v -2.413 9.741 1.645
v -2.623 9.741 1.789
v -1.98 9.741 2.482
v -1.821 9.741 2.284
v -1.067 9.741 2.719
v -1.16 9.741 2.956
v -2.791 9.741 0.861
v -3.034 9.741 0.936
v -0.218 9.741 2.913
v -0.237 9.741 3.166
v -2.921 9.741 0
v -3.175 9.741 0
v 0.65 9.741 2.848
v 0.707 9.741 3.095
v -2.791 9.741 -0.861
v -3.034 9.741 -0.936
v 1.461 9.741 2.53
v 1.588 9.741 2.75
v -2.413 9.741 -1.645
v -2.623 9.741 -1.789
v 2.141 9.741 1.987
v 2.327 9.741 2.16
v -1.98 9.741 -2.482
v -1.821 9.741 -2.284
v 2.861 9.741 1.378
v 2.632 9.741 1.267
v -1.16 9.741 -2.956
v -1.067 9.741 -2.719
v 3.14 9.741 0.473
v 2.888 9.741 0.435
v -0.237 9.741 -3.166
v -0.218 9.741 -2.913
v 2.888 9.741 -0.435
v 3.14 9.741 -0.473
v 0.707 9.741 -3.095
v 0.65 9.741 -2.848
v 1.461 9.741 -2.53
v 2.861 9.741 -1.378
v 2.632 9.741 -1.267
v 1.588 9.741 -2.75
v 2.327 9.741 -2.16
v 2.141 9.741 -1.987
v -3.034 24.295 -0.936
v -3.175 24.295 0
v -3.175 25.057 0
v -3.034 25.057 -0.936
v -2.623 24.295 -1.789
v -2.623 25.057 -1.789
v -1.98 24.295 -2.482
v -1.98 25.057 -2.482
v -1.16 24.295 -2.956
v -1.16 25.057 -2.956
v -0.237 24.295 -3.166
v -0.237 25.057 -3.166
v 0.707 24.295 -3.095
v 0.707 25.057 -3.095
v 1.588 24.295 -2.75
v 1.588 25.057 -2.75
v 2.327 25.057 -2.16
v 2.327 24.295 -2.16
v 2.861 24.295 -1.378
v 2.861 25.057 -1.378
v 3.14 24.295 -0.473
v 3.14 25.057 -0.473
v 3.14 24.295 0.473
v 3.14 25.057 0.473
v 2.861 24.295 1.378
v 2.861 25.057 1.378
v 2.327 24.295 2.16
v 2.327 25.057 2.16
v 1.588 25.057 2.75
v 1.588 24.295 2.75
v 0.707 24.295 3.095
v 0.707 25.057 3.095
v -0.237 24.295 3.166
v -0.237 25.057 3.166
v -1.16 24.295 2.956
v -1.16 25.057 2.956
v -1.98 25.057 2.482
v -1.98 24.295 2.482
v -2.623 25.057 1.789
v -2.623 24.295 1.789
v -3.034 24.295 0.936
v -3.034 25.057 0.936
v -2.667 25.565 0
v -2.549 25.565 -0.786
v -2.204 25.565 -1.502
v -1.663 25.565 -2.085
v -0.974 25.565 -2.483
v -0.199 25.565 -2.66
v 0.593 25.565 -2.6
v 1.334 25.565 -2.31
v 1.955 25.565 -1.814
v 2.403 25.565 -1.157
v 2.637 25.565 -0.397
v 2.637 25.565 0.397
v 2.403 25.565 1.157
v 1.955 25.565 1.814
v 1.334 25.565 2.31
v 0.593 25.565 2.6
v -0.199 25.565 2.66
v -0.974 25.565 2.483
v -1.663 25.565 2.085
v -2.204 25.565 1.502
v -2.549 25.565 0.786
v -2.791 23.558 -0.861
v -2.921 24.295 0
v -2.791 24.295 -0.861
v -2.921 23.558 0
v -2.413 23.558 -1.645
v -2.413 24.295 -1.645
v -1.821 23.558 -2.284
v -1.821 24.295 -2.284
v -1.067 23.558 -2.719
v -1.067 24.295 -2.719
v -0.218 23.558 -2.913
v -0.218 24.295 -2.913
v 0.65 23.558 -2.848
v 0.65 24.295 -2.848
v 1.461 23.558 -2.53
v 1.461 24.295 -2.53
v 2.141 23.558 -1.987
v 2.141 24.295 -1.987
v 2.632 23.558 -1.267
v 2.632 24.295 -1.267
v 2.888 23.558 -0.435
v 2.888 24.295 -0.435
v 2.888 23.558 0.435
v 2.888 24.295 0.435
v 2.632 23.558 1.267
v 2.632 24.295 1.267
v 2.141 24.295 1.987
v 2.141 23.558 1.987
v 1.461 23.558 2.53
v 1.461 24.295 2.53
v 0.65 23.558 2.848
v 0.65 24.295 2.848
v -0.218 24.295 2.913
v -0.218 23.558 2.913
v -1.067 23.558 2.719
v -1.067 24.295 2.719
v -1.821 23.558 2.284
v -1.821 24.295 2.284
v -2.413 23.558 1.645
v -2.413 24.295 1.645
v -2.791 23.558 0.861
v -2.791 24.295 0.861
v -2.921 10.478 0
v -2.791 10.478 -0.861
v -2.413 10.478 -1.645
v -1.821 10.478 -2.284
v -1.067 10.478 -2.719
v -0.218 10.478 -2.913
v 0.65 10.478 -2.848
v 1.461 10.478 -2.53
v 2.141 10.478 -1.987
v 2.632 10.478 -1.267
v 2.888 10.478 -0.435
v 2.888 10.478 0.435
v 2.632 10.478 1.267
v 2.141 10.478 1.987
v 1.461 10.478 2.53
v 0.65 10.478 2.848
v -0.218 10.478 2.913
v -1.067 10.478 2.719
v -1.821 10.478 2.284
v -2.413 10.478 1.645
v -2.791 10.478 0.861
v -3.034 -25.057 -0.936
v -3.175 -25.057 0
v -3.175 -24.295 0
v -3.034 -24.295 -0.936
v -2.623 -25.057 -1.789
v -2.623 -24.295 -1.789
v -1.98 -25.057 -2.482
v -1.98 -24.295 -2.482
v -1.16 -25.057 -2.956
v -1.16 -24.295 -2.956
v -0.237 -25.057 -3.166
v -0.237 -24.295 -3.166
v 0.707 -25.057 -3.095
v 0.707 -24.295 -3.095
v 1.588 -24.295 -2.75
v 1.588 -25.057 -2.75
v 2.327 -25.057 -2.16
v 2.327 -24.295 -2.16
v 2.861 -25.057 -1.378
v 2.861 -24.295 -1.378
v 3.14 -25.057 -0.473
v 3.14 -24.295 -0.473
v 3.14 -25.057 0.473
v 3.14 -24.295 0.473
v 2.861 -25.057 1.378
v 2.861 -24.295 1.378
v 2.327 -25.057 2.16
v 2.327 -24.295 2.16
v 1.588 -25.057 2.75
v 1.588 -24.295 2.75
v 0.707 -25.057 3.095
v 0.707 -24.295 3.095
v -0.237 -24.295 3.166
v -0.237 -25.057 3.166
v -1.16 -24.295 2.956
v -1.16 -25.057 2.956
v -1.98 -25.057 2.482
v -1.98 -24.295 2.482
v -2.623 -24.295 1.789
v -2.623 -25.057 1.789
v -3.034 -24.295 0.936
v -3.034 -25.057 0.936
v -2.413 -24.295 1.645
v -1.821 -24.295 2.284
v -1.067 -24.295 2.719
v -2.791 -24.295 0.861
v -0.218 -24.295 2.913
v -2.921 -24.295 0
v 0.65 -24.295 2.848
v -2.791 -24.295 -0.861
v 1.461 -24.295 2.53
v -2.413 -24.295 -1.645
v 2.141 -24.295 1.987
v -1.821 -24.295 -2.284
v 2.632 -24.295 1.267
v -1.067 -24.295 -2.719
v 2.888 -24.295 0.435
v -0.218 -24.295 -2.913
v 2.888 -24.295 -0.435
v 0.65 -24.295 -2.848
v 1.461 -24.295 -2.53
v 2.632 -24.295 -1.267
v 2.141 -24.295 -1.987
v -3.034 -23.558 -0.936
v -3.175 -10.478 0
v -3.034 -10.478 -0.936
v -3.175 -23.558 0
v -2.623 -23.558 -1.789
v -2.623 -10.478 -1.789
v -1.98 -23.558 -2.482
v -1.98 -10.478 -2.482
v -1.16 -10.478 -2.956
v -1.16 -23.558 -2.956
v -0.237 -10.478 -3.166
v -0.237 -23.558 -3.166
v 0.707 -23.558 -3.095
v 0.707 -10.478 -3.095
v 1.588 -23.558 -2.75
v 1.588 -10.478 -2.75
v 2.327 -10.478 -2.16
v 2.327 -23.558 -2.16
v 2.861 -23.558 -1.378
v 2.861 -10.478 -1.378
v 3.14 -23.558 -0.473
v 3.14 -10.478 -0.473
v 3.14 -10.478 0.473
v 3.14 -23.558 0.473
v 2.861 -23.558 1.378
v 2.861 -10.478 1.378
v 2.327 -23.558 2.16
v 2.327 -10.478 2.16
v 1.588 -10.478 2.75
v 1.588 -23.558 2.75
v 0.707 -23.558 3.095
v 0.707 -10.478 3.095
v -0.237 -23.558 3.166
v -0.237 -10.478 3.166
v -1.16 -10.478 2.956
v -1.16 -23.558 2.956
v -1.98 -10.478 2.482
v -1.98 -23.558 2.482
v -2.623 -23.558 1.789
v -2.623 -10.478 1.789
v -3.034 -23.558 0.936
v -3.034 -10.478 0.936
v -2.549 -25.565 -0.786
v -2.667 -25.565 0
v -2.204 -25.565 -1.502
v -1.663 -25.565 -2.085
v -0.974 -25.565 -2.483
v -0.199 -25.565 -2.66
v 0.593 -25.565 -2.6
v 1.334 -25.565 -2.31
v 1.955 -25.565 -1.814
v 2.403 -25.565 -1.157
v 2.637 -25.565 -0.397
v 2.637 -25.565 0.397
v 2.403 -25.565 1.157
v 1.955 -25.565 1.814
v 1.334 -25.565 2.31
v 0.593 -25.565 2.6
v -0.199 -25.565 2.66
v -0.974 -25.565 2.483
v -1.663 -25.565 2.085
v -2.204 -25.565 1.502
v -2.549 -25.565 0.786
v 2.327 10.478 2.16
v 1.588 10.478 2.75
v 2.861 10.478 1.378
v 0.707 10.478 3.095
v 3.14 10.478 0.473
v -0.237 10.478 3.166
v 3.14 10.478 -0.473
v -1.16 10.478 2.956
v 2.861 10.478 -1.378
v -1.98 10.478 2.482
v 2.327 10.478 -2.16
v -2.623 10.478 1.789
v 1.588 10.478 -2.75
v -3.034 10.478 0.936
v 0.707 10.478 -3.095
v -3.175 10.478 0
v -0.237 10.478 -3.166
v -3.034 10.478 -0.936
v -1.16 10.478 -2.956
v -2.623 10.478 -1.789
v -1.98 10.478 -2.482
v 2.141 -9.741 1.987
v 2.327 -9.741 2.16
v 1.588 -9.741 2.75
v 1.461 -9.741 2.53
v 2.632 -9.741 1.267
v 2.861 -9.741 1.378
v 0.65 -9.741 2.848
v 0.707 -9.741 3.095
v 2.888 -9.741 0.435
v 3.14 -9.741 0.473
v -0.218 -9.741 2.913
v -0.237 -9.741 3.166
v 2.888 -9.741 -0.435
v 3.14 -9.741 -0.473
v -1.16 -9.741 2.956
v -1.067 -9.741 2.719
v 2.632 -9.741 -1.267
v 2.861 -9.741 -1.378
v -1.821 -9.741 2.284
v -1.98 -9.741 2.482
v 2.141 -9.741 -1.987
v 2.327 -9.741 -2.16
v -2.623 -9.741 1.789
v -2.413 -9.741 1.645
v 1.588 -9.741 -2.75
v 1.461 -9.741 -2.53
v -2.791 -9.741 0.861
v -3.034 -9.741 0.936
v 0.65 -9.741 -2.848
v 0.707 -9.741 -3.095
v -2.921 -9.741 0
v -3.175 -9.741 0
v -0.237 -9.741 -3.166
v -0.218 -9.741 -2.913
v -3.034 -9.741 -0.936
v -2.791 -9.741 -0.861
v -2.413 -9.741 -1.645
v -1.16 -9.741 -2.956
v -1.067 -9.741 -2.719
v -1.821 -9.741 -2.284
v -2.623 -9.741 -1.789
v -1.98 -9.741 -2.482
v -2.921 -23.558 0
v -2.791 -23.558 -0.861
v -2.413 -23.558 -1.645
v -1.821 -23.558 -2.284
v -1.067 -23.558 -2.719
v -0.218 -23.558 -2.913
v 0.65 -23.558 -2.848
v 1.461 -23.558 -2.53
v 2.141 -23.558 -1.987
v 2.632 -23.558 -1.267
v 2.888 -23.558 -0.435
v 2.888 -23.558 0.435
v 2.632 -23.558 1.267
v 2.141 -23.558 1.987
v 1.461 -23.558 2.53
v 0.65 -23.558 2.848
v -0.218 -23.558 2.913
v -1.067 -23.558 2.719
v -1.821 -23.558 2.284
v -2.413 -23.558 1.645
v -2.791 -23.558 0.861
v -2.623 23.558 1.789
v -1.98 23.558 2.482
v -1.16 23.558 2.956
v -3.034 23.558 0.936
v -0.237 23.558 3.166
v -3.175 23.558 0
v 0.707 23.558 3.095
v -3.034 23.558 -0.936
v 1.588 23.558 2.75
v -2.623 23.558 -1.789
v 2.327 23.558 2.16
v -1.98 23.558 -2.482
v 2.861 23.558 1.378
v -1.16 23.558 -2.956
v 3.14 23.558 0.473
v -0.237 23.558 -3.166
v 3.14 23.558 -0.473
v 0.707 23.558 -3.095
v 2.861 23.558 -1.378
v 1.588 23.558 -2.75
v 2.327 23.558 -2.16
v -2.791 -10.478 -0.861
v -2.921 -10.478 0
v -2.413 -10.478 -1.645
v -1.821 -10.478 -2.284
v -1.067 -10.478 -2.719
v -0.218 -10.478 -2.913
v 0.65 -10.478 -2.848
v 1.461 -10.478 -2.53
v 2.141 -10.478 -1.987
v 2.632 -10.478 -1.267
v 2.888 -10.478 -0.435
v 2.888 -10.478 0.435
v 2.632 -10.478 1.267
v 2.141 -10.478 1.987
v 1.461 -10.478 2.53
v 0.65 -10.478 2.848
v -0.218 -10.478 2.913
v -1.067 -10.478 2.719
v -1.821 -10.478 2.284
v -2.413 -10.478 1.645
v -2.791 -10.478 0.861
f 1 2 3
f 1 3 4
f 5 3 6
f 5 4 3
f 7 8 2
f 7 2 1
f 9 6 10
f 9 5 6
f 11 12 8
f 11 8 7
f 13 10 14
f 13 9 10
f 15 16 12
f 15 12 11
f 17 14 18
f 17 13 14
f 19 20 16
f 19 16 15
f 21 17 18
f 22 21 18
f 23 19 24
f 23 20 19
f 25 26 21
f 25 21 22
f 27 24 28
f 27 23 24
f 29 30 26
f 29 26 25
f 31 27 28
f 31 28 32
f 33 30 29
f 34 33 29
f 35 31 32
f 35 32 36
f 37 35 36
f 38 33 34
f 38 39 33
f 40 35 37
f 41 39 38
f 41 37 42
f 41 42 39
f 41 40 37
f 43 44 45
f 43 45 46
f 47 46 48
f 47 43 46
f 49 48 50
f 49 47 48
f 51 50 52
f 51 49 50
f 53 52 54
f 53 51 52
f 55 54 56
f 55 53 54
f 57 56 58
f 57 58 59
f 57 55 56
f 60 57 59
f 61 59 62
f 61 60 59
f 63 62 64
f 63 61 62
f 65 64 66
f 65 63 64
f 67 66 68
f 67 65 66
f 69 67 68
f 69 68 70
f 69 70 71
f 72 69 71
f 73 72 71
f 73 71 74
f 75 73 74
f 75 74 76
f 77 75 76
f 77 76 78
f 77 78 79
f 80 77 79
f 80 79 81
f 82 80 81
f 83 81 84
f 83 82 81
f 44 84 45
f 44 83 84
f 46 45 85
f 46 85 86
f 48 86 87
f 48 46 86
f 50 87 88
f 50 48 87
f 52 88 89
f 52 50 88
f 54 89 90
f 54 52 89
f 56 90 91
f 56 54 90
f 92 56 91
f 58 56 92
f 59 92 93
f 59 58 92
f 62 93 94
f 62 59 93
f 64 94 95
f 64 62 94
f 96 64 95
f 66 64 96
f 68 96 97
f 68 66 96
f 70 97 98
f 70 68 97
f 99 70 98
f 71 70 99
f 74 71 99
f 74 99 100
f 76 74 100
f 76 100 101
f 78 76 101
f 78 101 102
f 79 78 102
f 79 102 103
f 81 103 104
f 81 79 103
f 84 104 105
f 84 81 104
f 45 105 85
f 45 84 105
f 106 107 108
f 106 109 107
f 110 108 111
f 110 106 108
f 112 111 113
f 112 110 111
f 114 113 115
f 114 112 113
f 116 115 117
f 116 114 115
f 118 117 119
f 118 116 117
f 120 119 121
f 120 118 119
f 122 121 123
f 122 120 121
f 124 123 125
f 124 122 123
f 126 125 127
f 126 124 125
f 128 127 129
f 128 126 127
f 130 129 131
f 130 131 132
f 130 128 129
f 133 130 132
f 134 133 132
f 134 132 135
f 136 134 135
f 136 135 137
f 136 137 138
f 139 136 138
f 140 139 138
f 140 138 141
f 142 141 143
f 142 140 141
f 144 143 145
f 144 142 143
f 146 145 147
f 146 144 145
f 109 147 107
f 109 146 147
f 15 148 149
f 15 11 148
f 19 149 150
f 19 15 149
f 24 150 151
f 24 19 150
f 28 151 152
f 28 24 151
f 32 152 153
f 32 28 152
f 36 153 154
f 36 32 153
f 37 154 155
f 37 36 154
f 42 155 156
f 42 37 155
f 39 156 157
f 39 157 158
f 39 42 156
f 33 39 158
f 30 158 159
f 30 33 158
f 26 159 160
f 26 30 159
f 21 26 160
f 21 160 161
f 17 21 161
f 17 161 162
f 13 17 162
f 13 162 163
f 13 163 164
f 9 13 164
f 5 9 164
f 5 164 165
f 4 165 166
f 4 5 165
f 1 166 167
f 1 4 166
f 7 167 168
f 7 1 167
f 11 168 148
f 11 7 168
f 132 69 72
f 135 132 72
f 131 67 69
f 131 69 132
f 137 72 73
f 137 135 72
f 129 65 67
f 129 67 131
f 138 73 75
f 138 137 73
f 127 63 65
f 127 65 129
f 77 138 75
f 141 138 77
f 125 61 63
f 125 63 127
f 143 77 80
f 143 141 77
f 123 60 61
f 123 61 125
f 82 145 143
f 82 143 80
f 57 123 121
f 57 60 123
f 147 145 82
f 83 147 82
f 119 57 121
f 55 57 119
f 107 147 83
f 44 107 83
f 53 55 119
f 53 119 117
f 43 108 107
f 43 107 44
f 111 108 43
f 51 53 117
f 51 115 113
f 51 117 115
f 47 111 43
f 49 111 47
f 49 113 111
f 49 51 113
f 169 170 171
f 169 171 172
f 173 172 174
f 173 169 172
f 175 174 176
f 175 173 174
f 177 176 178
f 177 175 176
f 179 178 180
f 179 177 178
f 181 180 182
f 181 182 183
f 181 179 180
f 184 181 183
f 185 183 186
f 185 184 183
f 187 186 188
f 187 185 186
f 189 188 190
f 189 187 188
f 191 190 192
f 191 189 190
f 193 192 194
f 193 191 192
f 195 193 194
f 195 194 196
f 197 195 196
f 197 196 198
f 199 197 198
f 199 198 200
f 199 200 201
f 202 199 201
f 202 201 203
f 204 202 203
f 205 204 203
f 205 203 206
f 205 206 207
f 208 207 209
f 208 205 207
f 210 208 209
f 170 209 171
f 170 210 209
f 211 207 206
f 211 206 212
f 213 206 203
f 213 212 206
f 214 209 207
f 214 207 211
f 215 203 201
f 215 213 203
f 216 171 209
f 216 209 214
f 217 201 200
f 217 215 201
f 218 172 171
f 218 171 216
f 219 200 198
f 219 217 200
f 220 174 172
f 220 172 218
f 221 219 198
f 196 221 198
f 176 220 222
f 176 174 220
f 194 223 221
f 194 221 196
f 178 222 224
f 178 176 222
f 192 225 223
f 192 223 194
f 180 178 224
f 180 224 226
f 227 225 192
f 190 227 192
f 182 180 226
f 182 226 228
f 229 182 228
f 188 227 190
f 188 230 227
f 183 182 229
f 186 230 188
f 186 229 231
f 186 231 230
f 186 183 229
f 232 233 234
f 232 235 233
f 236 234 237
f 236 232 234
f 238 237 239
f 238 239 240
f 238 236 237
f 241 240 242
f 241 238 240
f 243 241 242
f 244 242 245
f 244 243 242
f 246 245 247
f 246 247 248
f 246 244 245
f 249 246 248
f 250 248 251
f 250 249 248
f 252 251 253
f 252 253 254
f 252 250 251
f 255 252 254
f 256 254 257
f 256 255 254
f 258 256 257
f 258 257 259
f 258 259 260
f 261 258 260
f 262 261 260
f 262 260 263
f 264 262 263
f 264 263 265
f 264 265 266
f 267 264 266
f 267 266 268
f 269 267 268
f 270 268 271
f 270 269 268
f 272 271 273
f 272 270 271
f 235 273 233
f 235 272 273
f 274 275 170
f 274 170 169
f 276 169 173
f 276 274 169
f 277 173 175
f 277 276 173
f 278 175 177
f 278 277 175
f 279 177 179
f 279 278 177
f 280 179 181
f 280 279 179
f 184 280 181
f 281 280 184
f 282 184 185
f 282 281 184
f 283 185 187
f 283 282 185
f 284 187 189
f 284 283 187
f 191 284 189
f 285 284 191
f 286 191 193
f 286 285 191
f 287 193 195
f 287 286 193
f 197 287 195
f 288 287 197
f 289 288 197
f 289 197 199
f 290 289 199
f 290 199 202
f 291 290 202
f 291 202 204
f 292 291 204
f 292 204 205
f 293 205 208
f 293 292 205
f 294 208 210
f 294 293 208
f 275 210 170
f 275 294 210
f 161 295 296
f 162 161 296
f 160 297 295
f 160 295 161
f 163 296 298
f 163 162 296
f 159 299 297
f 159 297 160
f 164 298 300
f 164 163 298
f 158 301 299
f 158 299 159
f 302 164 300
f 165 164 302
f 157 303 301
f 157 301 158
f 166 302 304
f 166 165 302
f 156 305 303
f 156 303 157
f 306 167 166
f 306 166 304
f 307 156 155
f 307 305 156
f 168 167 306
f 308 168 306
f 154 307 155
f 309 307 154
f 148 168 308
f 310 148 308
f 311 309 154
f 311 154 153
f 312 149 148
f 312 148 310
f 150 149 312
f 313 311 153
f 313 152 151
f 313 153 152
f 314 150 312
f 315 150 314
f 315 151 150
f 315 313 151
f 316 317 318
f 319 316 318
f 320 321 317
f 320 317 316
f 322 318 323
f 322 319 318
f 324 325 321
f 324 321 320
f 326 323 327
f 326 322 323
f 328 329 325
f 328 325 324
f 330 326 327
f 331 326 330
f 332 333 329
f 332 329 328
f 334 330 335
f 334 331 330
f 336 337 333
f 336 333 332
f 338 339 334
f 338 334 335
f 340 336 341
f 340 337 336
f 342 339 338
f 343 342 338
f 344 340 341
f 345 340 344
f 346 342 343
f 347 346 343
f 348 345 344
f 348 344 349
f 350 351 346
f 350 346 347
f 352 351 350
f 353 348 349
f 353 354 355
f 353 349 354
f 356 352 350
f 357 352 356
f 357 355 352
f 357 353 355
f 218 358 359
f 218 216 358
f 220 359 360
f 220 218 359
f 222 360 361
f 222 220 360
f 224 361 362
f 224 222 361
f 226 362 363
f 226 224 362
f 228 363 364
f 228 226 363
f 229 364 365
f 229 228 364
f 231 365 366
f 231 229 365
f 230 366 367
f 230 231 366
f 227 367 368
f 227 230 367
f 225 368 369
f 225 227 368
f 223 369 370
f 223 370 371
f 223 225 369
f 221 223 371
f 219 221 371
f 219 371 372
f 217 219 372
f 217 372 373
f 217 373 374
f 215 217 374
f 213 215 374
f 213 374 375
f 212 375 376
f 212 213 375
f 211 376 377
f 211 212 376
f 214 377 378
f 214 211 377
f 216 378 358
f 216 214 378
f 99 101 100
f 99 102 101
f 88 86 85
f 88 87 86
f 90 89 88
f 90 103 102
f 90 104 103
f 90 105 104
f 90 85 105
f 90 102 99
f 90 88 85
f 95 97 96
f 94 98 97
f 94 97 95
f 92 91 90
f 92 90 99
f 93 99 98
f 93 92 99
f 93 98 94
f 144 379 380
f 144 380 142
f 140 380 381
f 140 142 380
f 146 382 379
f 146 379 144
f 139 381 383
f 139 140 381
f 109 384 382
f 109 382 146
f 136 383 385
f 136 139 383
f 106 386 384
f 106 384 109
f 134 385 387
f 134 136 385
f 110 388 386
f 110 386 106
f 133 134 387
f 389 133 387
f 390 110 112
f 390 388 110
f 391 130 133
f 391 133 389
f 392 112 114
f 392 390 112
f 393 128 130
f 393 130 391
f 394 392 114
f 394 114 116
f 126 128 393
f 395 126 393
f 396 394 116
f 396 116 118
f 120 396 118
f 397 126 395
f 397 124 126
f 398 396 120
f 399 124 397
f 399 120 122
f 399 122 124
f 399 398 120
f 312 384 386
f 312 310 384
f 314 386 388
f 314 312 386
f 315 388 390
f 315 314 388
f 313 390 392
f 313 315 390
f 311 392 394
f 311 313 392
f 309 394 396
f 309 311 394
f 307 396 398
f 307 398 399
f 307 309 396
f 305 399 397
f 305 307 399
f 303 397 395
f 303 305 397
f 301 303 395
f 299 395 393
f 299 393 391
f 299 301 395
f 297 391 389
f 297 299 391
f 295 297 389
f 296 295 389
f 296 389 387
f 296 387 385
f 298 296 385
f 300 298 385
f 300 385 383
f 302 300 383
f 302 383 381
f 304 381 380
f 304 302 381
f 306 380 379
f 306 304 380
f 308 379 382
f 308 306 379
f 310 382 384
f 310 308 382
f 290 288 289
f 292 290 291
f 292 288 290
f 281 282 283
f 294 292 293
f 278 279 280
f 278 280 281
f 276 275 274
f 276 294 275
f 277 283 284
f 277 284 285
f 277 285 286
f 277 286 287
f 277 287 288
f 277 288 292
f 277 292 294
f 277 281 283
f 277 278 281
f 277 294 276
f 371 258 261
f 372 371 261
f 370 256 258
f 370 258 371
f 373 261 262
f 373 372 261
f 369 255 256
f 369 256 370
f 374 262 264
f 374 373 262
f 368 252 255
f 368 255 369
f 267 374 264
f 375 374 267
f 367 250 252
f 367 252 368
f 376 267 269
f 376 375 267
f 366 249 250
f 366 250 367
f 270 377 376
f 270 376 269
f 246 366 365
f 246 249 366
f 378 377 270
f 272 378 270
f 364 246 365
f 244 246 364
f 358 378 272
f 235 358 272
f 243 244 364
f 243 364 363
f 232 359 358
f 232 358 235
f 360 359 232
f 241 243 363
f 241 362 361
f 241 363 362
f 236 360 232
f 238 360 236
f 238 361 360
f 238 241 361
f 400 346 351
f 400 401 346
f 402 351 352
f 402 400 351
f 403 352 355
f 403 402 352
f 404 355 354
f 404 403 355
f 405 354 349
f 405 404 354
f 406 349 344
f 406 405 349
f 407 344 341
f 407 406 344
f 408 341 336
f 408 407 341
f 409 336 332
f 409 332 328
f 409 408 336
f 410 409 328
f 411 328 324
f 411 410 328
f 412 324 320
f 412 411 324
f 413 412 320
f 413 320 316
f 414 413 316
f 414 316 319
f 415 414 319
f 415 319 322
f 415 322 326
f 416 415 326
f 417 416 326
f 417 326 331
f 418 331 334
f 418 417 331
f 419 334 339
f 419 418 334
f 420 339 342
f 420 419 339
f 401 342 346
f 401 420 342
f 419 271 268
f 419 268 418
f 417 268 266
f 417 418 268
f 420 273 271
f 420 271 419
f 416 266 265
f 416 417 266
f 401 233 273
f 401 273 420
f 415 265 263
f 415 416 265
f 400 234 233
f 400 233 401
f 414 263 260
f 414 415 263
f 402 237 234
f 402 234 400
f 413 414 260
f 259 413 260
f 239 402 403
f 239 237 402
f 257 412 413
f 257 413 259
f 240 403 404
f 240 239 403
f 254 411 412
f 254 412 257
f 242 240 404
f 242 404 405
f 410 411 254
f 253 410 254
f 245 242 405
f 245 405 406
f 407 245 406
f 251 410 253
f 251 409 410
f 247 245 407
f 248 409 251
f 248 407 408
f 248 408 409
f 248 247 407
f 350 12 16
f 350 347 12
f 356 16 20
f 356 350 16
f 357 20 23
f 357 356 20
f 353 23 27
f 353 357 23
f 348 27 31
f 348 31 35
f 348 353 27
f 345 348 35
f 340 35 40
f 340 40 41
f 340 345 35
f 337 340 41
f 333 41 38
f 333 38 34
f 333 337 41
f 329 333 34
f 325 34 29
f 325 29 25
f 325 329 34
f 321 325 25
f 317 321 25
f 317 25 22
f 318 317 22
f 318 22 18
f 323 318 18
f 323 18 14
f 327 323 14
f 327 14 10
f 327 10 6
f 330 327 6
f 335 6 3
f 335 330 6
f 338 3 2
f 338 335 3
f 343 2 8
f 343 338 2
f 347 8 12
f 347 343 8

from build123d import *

# Parameters (mm, degrees)
CHAMFER1_SIZE = 0.508


with BuildPart() as part:
    # Sketch1 → Revolve1 (revolve)
    with BuildSketch(Plane.XY):
        Polygon((-3.175, 23.5585), (-3.175, 10.4775), (-2.921, 10.4775), (-2.921, 9.7409), (-3.175, 9.7409), (-3.175, -9.7409), (-2.921, -9.7409), (-2.921, -10.4775), (-3.175, -10.4775), (-3.175, -23.5585), (-2.921, -23.5585), (-2.921, -24.2951), (-3.175, -24.2951), (-3.175, -25.5651), (0, -25.5651), (0, 25.5651), (-3.175, 25.5651), (-3.175, 24.2951), (-2.921, 24.2951), (-2.921, 23.5585), align=None)
    revolve(axis=Axis((0, 25.5651, 0), (0, -1, 0)))

    # Chamfer1
    chamfer1_edges = [part.edges().sort_by_distance(p)[0] for p in [
        (3.175, 25.5651, 0),
        (3.175, -25.5651, 0),
    ]]
    chamfer(chamfer1_edges, length=CHAMFER1_SIZE)


solid = part.part
